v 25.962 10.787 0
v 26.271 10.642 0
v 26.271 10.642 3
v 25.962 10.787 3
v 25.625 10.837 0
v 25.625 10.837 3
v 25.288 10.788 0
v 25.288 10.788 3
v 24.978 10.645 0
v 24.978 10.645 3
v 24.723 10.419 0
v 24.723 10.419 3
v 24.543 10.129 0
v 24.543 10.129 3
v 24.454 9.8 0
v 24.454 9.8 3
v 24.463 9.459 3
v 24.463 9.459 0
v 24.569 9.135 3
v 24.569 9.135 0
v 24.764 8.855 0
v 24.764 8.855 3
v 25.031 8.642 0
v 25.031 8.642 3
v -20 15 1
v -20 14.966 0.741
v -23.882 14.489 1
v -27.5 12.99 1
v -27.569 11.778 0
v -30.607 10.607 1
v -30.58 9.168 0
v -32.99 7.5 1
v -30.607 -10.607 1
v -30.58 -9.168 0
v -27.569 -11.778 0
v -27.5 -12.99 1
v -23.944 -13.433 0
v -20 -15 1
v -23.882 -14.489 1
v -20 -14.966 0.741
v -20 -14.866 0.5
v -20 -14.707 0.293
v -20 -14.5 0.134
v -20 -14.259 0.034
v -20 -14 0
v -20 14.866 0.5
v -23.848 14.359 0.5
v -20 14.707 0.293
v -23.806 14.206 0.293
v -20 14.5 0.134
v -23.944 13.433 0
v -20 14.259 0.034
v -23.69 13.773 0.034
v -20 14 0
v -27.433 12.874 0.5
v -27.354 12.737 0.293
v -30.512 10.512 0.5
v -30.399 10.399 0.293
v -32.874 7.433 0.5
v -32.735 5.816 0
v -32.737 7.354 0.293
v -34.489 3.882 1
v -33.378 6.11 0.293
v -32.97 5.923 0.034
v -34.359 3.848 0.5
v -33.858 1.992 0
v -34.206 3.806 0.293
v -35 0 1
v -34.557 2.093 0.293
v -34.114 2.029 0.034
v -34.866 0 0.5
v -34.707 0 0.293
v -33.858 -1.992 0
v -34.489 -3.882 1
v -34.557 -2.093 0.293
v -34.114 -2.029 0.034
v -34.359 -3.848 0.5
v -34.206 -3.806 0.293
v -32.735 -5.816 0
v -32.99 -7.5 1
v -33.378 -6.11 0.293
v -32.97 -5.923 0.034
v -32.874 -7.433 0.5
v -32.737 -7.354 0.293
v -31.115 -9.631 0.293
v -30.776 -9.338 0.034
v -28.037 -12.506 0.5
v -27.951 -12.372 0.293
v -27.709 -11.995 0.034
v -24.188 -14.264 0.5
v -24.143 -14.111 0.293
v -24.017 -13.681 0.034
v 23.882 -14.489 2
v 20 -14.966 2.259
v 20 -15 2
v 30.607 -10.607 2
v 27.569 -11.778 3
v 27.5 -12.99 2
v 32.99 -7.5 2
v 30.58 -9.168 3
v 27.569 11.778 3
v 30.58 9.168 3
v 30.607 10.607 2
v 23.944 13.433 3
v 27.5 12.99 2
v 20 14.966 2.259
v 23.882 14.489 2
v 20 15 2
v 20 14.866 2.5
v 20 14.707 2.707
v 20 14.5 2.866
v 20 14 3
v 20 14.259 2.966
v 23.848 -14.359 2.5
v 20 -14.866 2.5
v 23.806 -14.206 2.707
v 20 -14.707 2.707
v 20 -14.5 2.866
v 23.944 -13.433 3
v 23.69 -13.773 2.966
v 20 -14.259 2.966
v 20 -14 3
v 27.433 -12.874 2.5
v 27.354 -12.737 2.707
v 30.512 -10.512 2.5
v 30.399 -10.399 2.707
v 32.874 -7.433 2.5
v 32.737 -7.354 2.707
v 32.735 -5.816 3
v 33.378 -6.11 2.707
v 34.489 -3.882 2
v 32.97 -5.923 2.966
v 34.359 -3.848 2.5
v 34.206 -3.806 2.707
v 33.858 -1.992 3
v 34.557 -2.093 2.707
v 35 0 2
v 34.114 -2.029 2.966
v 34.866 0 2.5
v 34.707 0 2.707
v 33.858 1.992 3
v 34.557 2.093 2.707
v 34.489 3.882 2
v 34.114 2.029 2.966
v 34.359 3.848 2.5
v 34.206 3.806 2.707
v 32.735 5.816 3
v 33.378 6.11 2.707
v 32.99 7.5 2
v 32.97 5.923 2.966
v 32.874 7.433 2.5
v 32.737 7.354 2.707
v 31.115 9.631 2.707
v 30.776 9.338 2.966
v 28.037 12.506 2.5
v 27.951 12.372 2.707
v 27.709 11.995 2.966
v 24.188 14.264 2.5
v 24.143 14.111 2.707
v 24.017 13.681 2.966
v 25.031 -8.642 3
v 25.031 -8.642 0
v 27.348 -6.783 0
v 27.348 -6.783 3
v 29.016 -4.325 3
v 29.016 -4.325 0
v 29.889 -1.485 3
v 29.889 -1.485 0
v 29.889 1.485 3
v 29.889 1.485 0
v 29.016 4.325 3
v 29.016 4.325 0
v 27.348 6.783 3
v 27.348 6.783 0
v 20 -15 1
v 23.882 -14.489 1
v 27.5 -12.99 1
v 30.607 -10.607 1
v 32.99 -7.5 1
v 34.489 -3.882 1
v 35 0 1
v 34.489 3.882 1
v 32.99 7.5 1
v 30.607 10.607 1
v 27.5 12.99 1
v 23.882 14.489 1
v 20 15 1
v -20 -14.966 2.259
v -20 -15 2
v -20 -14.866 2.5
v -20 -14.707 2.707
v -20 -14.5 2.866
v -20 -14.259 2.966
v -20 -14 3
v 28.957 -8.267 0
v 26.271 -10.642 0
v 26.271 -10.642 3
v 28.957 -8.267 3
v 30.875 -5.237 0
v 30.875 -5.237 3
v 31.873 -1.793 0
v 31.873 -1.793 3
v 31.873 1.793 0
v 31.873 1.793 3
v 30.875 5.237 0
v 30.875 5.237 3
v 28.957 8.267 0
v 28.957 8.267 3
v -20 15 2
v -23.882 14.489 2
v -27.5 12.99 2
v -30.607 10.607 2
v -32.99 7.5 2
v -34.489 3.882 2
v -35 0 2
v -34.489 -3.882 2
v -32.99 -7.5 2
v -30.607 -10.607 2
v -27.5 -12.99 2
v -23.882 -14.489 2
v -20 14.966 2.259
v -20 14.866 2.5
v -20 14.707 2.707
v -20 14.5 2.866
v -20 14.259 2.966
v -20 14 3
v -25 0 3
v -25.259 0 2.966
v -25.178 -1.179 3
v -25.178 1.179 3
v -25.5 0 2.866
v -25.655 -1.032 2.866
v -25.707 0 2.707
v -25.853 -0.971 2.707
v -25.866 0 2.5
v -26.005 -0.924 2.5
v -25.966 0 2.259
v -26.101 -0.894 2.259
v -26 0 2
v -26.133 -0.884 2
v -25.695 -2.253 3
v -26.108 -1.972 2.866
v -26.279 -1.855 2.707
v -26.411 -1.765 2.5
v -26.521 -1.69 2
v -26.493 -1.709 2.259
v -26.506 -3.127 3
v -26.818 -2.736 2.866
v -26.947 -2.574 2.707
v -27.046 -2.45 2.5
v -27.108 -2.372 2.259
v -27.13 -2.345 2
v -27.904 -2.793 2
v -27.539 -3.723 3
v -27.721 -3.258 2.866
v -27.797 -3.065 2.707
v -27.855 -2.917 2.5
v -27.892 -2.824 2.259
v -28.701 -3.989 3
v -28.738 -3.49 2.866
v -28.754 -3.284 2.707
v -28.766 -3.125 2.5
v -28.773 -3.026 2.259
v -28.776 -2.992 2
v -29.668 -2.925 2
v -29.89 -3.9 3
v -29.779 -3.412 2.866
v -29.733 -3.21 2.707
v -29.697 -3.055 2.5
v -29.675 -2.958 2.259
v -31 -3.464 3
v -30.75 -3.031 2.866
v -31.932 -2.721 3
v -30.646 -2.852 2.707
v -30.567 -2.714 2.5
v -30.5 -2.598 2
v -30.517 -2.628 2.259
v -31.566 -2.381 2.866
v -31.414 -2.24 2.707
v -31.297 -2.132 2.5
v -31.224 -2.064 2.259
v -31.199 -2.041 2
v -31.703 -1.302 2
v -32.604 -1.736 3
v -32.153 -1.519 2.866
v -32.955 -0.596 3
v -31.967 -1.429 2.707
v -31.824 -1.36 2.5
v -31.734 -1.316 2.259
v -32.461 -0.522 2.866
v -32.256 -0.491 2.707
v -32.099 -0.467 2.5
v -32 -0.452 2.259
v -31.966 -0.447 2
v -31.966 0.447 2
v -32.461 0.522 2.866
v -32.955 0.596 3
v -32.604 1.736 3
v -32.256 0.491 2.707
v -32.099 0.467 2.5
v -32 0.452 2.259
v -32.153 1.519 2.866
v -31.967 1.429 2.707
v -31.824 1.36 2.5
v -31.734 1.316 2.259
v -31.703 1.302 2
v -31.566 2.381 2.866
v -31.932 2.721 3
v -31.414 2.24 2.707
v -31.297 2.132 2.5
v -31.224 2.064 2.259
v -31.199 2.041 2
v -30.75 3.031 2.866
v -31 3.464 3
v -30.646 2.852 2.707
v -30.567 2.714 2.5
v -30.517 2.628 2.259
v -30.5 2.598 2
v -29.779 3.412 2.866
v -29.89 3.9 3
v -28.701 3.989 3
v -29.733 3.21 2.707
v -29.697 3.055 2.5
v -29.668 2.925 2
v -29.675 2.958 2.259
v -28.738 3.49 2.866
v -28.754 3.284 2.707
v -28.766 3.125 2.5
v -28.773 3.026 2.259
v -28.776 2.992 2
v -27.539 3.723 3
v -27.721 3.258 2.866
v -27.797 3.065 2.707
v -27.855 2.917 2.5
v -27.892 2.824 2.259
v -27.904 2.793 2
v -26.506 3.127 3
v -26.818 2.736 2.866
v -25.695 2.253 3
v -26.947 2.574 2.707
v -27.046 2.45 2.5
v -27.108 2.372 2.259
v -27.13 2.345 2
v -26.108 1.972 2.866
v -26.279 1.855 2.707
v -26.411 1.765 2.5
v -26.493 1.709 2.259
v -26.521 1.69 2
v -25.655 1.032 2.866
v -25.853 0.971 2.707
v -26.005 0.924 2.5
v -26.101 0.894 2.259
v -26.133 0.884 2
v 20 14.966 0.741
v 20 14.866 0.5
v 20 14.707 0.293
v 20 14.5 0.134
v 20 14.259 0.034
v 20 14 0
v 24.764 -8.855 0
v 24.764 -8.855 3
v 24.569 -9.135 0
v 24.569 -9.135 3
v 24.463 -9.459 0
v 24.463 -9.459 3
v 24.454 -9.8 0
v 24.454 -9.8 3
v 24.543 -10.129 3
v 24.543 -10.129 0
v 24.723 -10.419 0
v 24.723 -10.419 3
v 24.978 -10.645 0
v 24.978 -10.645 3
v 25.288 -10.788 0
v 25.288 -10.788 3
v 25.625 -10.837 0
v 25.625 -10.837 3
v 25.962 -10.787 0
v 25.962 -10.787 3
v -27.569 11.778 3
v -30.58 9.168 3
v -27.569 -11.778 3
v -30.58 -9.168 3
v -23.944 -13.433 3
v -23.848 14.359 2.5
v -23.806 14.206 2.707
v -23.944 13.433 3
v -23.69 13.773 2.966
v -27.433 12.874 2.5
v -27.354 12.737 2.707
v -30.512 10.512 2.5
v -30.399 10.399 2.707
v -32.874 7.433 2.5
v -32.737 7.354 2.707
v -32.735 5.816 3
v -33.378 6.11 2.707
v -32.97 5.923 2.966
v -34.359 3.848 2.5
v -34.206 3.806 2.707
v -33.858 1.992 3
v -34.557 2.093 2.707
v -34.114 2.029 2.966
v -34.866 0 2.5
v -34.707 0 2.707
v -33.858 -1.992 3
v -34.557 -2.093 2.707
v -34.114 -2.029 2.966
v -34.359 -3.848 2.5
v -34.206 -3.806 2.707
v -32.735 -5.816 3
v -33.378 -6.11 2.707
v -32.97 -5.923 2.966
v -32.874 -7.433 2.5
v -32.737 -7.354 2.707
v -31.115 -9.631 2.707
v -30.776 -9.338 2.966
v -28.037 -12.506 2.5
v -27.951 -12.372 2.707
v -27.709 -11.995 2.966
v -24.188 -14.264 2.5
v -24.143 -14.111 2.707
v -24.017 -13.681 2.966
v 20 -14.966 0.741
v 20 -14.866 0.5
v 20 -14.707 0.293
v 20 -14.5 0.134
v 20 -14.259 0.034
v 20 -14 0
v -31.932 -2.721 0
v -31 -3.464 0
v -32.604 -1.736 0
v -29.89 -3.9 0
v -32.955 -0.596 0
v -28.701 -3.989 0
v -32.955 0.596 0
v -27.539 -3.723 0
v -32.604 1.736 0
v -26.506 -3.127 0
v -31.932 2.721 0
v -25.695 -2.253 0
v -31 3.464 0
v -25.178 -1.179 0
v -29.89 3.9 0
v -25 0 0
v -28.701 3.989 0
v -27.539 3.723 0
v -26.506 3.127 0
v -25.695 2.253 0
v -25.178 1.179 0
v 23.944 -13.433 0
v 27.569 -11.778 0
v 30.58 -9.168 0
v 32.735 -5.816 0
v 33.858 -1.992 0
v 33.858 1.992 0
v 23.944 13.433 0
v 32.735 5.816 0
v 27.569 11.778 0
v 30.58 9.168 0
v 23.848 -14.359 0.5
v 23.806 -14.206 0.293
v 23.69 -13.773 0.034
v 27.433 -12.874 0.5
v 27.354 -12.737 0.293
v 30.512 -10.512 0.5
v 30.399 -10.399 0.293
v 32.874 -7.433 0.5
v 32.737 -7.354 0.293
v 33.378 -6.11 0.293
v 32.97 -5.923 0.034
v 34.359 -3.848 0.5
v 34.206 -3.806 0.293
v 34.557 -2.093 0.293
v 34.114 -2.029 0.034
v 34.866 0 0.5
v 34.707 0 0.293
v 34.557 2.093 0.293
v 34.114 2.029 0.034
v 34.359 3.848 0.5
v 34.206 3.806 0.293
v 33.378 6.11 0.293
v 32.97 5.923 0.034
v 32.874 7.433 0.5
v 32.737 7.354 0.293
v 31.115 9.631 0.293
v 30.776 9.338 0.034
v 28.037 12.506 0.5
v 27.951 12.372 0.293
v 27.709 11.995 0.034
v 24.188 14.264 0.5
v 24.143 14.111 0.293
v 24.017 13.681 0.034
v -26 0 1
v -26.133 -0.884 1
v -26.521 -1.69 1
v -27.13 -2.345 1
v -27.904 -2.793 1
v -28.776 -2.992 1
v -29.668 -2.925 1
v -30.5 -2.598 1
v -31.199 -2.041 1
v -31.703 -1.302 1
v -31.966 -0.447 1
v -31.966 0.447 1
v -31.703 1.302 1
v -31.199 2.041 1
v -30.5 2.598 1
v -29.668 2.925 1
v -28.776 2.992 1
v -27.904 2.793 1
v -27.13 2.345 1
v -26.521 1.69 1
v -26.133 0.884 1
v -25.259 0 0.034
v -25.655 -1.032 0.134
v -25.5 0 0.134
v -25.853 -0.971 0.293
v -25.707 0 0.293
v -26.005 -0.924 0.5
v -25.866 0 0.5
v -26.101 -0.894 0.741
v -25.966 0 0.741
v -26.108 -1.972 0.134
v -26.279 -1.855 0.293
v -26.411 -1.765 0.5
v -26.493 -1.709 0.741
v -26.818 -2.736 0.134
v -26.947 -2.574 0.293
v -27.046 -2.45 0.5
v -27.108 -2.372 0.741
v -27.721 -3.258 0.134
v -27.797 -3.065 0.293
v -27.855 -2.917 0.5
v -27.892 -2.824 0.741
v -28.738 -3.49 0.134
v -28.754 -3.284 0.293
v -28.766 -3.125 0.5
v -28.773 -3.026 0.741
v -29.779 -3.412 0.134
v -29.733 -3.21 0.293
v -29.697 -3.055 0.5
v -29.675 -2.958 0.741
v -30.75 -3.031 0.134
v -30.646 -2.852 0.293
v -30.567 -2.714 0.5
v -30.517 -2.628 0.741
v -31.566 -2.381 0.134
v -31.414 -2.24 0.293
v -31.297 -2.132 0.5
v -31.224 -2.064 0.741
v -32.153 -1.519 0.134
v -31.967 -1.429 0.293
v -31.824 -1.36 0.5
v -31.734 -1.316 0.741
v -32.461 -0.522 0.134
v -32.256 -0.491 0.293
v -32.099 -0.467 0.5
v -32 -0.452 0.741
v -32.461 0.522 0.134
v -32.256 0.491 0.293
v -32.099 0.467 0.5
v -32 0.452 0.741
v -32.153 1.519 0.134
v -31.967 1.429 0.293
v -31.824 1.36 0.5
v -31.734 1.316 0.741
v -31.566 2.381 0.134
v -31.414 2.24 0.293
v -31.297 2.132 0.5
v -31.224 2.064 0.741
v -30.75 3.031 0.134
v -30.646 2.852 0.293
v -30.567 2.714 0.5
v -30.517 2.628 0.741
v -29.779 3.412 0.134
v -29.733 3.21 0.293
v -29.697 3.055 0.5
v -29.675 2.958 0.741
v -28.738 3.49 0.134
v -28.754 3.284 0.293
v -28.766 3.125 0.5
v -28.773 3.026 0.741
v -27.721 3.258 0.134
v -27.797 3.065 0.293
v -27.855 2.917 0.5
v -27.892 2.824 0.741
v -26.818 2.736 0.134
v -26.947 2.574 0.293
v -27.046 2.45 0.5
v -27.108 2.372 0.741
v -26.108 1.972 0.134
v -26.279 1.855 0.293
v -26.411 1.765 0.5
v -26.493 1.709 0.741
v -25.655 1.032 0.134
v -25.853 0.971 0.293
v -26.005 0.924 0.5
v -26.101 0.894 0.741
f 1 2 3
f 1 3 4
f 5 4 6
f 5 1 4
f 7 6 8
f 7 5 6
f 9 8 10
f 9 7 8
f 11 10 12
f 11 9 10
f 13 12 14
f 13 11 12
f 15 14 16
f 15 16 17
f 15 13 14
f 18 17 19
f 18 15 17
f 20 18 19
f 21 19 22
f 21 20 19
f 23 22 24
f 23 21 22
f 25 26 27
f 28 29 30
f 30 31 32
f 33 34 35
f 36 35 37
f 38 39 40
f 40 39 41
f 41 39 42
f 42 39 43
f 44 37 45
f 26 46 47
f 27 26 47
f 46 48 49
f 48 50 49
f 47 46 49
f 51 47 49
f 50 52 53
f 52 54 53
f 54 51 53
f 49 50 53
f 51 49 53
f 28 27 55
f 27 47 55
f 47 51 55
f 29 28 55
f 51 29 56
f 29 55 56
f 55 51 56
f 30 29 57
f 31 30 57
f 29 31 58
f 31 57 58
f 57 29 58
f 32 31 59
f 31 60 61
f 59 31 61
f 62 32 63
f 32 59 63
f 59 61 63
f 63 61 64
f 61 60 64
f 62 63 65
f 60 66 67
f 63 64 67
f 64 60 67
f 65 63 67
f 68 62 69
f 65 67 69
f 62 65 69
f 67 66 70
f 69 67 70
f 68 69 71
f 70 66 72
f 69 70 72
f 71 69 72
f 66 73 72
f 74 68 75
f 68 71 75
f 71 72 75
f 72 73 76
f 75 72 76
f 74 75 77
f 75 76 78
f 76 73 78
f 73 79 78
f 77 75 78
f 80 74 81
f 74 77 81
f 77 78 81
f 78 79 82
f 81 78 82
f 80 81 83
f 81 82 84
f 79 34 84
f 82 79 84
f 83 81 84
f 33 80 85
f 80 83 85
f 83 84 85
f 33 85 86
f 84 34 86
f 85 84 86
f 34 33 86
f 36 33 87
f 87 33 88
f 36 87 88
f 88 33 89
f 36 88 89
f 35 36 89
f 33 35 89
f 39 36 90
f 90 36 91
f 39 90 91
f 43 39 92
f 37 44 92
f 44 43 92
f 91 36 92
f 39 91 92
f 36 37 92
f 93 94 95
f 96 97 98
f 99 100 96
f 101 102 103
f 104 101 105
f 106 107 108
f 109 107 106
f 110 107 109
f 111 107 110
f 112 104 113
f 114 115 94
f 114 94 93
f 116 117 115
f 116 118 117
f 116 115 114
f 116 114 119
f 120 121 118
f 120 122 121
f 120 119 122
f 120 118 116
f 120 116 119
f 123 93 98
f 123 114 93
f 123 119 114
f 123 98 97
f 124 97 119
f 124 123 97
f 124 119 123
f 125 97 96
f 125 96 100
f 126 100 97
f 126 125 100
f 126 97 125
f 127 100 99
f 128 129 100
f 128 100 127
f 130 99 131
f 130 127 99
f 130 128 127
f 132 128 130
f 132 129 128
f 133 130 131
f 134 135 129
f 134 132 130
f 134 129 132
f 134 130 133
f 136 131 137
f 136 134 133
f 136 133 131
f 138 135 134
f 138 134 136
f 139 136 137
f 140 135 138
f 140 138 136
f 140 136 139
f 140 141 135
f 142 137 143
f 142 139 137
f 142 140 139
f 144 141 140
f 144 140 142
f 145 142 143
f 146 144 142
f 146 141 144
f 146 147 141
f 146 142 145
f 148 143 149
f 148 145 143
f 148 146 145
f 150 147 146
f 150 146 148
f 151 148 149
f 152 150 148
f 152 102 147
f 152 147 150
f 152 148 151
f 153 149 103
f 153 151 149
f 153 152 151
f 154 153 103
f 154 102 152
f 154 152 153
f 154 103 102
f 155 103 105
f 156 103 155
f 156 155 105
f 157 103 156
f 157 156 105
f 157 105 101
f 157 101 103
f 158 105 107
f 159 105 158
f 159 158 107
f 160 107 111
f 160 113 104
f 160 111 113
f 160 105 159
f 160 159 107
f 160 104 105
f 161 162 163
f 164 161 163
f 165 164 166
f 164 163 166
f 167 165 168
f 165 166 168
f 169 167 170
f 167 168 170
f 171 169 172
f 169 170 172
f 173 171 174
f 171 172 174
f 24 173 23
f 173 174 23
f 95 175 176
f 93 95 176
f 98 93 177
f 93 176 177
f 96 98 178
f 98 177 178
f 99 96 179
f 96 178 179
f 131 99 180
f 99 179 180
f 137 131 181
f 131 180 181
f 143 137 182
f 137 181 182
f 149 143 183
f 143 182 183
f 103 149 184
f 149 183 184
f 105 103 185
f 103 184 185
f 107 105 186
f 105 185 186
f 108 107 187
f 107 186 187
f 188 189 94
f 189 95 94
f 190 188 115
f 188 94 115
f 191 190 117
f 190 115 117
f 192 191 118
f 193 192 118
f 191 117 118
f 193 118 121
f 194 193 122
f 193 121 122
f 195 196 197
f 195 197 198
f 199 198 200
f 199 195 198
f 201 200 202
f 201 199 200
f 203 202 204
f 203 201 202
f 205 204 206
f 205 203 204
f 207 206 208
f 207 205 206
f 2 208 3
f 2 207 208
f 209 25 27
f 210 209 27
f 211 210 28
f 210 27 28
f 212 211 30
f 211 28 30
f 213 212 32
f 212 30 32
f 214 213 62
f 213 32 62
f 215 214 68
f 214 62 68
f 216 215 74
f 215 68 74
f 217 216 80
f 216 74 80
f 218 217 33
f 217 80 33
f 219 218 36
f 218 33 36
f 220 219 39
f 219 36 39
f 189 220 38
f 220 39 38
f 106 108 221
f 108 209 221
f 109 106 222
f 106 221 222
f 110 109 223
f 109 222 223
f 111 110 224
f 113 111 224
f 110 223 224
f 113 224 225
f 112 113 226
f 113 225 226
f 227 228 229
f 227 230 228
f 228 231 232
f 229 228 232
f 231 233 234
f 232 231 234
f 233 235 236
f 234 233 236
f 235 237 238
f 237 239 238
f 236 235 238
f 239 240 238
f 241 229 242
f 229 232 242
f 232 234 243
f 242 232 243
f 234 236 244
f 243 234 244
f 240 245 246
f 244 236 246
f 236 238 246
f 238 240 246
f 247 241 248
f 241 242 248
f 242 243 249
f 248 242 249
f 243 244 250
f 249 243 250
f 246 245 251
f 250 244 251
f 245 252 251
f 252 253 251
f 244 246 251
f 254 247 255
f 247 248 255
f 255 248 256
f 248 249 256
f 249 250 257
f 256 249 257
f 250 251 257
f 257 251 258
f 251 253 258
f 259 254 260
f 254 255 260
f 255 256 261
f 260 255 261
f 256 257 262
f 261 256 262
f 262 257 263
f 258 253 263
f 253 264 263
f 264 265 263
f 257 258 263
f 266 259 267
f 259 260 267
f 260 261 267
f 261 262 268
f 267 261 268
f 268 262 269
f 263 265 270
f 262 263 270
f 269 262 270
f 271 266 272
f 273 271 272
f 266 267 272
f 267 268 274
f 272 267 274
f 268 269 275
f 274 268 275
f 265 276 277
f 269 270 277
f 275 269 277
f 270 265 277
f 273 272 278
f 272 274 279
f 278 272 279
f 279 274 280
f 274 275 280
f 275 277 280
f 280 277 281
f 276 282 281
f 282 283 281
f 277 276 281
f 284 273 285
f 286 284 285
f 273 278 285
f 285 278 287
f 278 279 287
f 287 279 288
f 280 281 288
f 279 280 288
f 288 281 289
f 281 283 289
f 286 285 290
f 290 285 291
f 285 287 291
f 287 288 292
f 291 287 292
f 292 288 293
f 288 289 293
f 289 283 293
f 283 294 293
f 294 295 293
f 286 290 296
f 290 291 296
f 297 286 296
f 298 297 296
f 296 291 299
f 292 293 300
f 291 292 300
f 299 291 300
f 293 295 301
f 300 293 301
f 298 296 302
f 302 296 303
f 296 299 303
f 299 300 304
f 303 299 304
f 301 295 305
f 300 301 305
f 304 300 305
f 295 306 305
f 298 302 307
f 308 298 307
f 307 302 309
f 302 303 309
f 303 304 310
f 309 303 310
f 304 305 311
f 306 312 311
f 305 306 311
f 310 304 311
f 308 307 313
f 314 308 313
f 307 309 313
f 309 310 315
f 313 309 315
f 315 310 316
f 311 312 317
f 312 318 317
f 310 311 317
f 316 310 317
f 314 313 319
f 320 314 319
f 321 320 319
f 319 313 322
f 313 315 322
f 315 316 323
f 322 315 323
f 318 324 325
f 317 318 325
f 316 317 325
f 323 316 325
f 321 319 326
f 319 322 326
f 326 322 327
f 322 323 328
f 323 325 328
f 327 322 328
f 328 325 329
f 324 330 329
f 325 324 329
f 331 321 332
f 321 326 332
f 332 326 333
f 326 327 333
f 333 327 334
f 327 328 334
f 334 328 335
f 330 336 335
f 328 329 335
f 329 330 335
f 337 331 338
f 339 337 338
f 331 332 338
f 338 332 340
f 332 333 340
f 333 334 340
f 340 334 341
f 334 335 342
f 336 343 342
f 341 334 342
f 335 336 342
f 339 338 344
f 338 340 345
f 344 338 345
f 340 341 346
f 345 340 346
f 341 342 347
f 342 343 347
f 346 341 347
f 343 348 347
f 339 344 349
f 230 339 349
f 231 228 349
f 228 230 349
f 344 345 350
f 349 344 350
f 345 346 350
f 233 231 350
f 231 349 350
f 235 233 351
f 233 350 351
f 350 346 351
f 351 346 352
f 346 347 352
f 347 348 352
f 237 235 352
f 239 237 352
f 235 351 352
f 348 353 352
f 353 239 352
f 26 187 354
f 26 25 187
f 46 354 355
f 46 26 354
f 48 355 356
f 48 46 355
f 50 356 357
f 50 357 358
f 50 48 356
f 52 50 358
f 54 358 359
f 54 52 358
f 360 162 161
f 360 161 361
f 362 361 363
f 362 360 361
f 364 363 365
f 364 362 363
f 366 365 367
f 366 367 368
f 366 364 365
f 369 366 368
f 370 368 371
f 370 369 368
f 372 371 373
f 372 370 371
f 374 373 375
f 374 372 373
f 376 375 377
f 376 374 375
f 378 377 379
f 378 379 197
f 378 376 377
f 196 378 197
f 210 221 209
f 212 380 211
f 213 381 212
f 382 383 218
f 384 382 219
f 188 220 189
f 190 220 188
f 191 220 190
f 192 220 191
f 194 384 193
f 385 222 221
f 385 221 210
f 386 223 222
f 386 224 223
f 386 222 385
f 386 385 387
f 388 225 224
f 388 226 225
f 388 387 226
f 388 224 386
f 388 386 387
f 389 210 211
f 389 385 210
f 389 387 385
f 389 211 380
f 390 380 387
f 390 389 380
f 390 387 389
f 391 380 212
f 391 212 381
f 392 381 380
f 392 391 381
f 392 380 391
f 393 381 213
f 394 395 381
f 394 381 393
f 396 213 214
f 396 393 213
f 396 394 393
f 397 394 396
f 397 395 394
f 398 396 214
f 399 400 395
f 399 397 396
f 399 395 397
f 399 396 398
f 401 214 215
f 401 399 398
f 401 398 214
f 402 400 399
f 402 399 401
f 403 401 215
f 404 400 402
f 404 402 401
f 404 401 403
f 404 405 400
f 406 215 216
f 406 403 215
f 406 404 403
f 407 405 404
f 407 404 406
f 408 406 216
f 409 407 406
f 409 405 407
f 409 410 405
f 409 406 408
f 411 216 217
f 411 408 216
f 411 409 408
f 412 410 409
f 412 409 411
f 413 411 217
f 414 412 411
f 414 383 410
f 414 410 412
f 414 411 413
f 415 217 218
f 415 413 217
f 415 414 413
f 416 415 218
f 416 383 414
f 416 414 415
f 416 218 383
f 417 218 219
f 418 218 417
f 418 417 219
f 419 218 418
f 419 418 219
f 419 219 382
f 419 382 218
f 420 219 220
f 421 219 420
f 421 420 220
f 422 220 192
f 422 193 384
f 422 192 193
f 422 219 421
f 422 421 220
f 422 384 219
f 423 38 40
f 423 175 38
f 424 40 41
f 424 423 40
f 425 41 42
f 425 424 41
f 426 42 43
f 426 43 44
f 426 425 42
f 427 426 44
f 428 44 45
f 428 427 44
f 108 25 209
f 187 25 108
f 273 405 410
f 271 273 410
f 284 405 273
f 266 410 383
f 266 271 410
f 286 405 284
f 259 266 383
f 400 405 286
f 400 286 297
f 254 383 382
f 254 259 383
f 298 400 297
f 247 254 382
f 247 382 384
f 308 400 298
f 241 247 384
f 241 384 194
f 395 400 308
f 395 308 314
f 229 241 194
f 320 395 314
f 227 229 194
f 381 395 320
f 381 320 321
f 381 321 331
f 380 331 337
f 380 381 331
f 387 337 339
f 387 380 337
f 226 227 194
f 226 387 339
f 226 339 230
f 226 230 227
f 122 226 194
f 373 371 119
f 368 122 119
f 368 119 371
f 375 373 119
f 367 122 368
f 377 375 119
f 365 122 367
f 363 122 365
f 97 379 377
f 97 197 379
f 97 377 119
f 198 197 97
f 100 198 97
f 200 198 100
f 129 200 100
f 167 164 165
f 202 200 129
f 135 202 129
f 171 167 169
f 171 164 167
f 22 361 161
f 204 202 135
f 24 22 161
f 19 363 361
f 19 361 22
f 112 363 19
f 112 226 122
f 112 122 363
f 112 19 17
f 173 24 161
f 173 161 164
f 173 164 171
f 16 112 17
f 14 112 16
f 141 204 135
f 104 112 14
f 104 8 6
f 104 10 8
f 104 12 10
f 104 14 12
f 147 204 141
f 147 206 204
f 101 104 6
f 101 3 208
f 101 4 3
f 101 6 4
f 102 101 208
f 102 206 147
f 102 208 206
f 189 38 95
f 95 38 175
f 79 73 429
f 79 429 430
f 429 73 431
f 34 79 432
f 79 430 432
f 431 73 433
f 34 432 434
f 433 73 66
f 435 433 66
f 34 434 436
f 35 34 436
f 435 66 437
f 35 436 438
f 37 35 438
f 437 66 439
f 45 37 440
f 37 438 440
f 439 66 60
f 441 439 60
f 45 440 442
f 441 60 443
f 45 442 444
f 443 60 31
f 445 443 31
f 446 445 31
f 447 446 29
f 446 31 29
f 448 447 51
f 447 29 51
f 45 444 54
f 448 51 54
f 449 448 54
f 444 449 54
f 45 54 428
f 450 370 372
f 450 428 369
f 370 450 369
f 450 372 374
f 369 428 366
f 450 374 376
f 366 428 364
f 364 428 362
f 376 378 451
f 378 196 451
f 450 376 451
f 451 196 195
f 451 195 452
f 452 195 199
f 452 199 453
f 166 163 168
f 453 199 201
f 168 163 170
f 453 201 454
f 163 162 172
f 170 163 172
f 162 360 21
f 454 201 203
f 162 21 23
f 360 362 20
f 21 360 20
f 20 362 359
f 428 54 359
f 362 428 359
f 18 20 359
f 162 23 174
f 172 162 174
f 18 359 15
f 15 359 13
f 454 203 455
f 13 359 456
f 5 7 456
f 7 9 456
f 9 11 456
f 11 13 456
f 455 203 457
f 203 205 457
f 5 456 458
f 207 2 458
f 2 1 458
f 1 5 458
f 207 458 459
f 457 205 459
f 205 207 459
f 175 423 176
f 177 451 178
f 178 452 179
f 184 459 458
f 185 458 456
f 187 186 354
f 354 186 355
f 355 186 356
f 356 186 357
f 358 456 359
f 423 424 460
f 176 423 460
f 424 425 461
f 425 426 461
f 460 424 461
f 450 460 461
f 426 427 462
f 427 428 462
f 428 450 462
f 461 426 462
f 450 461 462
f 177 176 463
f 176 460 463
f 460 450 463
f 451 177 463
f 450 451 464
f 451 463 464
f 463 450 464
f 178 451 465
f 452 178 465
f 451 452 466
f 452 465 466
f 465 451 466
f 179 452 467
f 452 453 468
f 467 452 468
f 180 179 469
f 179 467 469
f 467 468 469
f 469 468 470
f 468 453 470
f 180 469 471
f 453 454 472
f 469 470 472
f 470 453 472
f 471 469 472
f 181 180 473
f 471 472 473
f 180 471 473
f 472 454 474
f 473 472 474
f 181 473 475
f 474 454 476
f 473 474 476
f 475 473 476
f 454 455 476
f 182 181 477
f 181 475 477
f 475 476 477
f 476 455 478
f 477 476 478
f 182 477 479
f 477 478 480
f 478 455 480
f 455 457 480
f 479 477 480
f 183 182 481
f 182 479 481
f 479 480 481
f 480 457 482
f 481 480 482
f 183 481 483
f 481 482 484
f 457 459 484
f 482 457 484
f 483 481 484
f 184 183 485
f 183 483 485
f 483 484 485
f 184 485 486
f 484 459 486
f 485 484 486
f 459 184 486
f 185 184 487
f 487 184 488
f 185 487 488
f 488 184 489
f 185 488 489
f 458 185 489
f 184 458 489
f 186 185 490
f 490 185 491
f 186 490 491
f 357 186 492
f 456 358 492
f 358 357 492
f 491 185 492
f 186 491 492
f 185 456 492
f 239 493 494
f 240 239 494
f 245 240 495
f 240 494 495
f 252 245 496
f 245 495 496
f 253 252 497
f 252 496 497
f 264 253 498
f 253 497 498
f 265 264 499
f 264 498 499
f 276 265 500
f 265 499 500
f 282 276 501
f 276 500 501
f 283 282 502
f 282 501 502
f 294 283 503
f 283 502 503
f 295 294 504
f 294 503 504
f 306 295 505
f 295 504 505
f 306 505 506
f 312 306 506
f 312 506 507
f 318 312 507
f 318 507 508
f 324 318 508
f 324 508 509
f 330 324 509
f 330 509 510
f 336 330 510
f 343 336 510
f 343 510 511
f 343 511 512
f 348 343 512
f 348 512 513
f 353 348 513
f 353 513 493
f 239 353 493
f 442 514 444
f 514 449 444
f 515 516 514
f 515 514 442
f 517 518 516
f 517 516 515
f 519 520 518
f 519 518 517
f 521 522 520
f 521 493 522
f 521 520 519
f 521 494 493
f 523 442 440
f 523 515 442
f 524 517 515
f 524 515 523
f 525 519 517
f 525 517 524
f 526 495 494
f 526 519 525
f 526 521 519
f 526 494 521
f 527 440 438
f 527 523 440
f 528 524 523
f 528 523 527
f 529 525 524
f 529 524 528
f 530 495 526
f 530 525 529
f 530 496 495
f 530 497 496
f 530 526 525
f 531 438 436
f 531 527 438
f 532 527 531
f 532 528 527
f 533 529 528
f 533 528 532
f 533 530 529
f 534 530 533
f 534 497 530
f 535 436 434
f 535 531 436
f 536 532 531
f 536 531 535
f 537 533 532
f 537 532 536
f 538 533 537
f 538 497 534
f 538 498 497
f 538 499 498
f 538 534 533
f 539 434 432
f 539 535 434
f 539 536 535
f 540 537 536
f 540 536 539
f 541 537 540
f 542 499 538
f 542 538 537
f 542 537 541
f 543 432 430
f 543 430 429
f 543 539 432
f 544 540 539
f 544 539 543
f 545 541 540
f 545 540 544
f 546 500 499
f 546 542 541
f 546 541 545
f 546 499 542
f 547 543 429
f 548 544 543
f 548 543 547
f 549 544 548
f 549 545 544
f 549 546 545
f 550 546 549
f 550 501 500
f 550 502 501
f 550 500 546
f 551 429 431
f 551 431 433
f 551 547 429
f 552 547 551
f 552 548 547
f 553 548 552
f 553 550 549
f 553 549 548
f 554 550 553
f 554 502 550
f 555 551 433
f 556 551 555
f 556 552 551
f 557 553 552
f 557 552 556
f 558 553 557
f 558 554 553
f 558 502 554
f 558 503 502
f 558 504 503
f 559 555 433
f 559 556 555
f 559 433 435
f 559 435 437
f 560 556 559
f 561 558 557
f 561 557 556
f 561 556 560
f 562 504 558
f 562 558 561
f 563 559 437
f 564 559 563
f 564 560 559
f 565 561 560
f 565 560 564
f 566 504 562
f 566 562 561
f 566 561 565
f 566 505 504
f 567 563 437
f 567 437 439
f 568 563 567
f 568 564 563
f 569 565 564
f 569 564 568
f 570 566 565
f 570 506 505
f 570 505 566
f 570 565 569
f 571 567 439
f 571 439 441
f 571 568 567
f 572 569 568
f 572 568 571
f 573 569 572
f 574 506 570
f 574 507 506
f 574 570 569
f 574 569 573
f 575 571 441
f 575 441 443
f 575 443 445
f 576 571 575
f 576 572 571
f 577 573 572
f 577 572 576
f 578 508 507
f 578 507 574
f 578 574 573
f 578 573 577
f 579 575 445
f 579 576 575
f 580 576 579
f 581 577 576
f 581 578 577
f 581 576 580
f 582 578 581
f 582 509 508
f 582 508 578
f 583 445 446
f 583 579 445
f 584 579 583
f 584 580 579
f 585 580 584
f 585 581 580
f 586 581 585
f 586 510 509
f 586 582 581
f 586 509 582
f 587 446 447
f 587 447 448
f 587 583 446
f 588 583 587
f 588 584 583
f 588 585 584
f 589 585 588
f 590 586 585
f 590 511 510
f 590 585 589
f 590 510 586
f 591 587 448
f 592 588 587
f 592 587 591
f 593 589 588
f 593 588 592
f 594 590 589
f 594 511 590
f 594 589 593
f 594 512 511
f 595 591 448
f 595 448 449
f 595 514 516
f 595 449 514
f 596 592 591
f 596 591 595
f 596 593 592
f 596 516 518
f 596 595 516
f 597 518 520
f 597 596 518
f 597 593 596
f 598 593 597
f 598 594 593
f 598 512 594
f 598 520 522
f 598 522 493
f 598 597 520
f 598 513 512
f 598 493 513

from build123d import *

# Parameters (mm, degrees)
PAD_DEPTH    = 3
FILLET_R     = 1
SKETCH002_R  = 3
POCKET_DEPTH = 3.001
FILLET002_R  = 1


with BuildPart() as part:
    # Sketch → Pad (new body)
    with BuildSketch(Plane.XY):
        with BuildLine():
            ThreePointArc((-20, 15), (-35, 0), (-20, -15))
            Line((-20, -15), (20, -15))
            ThreePointArc((20, -15), (35, 0), (20, 15))
            Line((-20, 15), (20, 15))
        make_face()
        with BuildLine():
            ThreePointArc((26.271227, -10.642419), (32, 0), (26.271227, 10.642419))
            ThreePointArc((26.271227, 10.642419), (24.622589, 10.280269), (25.030765, 8.642419))
            ThreePointArc((25.030765, -8.642419), (30, 0), (25.030765, 8.642419))
            ThreePointArc((25.030765, -8.642419), (24.622589, -10.280269), (26.271227, -10.642419))
        make_face(mode=Mode.SUBTRACT)
    extrude(amount=PAD_DEPTH)

    # Fillet
    fillet_edges = [part.edges().sort_by_distance(p)[0] for p in [
        (0, -15, 3),
        (-35, 0, 0),
    ]]
    fillet(fillet_edges, radius=FILLET_R)

    # Sketch002 → Pocket (cut, through all)
    with BuildSketch(Plane(origin=(0, 0, 0), x_dir=(1, 0, 0), z_dir=(0, 0, -1))):
        with Locations((-29, 0)):
            Circle(SKETCH002_R)
    extrude(amount=-POCKET_DEPTH, mode=Mode.SUBTRACT)

    # Fillet002
    fillet002_edges = [part.edges().sort_by_distance(p)[0] for p in [
        (-32, 0, 3),
        (-32, 0, 0),
    ]]
    fillet(fillet002_edges, radius=FILLET002_R)


solid = part.part
